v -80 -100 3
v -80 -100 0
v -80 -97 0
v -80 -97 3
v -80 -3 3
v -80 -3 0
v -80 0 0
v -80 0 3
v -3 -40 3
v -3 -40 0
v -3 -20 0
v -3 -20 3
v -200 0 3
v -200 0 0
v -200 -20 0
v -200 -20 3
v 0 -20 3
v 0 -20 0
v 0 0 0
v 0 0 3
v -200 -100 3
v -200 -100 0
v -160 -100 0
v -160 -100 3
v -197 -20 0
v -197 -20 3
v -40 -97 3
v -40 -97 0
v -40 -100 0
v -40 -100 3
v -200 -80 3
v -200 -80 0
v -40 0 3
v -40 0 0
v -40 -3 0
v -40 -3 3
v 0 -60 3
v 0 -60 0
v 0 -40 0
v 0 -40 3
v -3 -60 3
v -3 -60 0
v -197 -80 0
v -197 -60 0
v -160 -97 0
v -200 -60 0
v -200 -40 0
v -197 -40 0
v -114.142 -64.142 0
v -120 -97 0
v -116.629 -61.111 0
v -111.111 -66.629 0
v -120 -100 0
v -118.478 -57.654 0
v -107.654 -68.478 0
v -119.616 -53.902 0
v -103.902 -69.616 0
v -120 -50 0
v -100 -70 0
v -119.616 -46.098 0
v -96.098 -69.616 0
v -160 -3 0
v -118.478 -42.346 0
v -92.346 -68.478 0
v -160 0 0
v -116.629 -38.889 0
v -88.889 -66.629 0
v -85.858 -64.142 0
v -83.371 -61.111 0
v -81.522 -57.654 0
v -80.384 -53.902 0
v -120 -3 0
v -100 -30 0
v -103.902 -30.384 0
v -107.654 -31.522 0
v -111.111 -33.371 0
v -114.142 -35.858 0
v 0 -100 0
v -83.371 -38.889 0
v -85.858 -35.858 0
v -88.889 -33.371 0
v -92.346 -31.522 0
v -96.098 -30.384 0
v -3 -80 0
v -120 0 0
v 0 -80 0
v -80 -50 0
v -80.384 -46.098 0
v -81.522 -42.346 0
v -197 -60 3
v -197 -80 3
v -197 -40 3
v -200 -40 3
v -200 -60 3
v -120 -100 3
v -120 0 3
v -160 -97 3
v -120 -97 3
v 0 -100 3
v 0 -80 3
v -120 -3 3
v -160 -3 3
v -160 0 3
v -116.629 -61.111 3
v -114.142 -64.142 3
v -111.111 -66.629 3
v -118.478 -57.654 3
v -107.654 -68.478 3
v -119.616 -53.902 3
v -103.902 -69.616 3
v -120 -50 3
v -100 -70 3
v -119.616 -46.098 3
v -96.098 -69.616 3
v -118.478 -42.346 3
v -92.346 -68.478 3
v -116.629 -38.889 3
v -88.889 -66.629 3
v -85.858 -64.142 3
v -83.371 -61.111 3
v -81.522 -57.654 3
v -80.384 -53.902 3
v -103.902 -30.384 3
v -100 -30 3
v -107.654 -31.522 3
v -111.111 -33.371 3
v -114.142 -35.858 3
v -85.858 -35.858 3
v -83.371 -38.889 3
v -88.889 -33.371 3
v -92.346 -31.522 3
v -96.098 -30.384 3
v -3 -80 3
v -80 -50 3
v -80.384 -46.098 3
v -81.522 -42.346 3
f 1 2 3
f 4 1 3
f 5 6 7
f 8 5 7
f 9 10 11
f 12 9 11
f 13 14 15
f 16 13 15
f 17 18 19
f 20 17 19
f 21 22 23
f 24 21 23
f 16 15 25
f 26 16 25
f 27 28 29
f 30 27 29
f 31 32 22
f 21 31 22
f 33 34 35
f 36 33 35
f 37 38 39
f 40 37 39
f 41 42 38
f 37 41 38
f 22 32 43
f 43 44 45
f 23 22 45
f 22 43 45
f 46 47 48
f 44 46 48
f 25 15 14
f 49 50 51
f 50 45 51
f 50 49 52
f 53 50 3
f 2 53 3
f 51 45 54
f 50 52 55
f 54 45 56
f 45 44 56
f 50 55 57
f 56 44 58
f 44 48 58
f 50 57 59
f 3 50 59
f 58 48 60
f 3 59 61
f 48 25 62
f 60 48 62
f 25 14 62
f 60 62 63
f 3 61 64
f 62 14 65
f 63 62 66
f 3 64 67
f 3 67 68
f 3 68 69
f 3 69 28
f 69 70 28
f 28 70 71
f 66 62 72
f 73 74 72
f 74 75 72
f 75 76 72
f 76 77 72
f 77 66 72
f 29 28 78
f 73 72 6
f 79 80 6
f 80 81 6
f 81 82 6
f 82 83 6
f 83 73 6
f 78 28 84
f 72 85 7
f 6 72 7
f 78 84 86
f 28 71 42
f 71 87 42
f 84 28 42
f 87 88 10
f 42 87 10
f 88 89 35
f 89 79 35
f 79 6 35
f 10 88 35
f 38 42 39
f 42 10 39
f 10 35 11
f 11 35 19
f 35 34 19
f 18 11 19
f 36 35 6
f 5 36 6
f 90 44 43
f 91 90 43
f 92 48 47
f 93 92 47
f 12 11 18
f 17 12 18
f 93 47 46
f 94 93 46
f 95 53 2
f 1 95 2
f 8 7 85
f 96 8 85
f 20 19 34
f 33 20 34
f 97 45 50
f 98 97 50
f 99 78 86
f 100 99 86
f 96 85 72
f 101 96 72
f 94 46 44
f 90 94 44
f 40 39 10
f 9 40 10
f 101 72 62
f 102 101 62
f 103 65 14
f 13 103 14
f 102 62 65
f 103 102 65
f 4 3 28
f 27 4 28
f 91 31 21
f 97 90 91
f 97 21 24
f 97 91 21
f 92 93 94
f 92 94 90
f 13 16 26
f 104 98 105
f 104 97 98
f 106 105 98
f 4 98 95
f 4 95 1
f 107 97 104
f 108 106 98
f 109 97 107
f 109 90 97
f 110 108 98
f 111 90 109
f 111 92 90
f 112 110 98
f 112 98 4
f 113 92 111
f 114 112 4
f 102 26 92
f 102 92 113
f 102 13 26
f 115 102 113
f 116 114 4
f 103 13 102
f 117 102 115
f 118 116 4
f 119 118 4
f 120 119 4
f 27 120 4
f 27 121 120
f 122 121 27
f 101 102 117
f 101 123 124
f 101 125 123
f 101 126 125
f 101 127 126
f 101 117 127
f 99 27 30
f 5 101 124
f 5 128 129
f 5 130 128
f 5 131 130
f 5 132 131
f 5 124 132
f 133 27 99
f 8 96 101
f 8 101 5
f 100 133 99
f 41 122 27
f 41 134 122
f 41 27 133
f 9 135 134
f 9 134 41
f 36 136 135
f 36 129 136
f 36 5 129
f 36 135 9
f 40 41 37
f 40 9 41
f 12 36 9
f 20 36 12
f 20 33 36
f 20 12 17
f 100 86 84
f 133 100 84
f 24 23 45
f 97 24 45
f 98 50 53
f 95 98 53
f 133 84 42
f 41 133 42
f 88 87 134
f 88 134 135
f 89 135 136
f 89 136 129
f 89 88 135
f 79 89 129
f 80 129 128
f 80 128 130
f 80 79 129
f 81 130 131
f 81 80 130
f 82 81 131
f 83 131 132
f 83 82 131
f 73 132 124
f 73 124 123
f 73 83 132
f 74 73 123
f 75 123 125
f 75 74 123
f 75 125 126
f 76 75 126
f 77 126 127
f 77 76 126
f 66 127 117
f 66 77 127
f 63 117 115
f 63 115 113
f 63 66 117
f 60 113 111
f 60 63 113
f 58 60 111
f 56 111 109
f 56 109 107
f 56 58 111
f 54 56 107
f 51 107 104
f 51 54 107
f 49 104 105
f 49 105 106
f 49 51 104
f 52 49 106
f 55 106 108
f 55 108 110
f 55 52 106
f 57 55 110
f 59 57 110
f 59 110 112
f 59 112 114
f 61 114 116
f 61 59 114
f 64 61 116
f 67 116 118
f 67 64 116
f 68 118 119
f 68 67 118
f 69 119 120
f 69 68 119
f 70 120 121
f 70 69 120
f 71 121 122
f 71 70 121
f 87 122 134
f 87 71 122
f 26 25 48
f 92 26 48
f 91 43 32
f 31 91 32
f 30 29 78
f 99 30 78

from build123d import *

# Parameters (mm, degrees)
F0_R     = 20
F1_DEPTH = 3


with BuildPart() as f1:
    # F0 (on Top) → F1 (new body)
    with BuildSketch(Plane.XY):
        Polygon((0, -20), (0, 0), (-40, 0), (-40, -3), (-80, -3), (-80, 0), (-120, 0), (-120, -3), (-160, -3), (-160, 0), (-200, 0), (-200, -20), (-197, -20), (-197, -40), (-200, -40), (-200, -60), (-197, -60), (-197, -80), (-200, -80), (-200, -100), (-160, -100), (-160, -97), (-120, -97), (-120, -100), (-80, -100), (-80, -97), (-40, -97), (-40, -100), (0, -100), (0, -80), (-3, -80), (-3, -60), (0, -60), (0, -40), (-3, -40), (-3, -20), align=None)
        with Locations((-100, -50)):
            Circle(F0_R, mode=Mode.SUBTRACT)
    extrude(amount=F1_DEPTH)


solid = f1.part
